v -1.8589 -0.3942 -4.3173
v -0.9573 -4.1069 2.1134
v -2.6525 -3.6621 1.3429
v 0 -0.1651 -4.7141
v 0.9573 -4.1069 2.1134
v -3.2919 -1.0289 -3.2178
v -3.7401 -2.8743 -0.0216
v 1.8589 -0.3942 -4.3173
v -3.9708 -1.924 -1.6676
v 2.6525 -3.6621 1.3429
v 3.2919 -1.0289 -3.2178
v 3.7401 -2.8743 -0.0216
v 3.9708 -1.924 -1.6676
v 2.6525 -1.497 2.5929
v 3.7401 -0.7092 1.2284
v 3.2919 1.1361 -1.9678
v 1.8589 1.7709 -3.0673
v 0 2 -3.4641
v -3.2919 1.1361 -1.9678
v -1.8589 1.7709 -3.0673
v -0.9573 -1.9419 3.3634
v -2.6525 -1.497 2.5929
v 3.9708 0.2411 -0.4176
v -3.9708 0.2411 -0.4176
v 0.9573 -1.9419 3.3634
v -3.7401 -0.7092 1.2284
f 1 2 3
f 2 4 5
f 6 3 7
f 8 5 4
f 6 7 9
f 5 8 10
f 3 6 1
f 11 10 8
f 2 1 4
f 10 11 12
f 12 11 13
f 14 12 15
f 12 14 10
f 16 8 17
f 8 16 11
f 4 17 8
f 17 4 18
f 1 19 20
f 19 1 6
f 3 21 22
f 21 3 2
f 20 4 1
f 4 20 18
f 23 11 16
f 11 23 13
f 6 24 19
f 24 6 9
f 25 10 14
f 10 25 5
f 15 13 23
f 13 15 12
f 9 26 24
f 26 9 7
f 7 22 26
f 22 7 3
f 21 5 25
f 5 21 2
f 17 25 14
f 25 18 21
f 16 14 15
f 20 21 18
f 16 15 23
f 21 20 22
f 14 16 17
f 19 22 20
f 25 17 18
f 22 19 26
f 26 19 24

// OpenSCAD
// Generated by generate_scads.py
rotate([180,60,90]) {
  intersection() {
    cube(size=[30,15,5], center=true);
    cylinder(h=20, r=4, center=true);
    cylinder(h=20, r=6, center=false);
  }
}
